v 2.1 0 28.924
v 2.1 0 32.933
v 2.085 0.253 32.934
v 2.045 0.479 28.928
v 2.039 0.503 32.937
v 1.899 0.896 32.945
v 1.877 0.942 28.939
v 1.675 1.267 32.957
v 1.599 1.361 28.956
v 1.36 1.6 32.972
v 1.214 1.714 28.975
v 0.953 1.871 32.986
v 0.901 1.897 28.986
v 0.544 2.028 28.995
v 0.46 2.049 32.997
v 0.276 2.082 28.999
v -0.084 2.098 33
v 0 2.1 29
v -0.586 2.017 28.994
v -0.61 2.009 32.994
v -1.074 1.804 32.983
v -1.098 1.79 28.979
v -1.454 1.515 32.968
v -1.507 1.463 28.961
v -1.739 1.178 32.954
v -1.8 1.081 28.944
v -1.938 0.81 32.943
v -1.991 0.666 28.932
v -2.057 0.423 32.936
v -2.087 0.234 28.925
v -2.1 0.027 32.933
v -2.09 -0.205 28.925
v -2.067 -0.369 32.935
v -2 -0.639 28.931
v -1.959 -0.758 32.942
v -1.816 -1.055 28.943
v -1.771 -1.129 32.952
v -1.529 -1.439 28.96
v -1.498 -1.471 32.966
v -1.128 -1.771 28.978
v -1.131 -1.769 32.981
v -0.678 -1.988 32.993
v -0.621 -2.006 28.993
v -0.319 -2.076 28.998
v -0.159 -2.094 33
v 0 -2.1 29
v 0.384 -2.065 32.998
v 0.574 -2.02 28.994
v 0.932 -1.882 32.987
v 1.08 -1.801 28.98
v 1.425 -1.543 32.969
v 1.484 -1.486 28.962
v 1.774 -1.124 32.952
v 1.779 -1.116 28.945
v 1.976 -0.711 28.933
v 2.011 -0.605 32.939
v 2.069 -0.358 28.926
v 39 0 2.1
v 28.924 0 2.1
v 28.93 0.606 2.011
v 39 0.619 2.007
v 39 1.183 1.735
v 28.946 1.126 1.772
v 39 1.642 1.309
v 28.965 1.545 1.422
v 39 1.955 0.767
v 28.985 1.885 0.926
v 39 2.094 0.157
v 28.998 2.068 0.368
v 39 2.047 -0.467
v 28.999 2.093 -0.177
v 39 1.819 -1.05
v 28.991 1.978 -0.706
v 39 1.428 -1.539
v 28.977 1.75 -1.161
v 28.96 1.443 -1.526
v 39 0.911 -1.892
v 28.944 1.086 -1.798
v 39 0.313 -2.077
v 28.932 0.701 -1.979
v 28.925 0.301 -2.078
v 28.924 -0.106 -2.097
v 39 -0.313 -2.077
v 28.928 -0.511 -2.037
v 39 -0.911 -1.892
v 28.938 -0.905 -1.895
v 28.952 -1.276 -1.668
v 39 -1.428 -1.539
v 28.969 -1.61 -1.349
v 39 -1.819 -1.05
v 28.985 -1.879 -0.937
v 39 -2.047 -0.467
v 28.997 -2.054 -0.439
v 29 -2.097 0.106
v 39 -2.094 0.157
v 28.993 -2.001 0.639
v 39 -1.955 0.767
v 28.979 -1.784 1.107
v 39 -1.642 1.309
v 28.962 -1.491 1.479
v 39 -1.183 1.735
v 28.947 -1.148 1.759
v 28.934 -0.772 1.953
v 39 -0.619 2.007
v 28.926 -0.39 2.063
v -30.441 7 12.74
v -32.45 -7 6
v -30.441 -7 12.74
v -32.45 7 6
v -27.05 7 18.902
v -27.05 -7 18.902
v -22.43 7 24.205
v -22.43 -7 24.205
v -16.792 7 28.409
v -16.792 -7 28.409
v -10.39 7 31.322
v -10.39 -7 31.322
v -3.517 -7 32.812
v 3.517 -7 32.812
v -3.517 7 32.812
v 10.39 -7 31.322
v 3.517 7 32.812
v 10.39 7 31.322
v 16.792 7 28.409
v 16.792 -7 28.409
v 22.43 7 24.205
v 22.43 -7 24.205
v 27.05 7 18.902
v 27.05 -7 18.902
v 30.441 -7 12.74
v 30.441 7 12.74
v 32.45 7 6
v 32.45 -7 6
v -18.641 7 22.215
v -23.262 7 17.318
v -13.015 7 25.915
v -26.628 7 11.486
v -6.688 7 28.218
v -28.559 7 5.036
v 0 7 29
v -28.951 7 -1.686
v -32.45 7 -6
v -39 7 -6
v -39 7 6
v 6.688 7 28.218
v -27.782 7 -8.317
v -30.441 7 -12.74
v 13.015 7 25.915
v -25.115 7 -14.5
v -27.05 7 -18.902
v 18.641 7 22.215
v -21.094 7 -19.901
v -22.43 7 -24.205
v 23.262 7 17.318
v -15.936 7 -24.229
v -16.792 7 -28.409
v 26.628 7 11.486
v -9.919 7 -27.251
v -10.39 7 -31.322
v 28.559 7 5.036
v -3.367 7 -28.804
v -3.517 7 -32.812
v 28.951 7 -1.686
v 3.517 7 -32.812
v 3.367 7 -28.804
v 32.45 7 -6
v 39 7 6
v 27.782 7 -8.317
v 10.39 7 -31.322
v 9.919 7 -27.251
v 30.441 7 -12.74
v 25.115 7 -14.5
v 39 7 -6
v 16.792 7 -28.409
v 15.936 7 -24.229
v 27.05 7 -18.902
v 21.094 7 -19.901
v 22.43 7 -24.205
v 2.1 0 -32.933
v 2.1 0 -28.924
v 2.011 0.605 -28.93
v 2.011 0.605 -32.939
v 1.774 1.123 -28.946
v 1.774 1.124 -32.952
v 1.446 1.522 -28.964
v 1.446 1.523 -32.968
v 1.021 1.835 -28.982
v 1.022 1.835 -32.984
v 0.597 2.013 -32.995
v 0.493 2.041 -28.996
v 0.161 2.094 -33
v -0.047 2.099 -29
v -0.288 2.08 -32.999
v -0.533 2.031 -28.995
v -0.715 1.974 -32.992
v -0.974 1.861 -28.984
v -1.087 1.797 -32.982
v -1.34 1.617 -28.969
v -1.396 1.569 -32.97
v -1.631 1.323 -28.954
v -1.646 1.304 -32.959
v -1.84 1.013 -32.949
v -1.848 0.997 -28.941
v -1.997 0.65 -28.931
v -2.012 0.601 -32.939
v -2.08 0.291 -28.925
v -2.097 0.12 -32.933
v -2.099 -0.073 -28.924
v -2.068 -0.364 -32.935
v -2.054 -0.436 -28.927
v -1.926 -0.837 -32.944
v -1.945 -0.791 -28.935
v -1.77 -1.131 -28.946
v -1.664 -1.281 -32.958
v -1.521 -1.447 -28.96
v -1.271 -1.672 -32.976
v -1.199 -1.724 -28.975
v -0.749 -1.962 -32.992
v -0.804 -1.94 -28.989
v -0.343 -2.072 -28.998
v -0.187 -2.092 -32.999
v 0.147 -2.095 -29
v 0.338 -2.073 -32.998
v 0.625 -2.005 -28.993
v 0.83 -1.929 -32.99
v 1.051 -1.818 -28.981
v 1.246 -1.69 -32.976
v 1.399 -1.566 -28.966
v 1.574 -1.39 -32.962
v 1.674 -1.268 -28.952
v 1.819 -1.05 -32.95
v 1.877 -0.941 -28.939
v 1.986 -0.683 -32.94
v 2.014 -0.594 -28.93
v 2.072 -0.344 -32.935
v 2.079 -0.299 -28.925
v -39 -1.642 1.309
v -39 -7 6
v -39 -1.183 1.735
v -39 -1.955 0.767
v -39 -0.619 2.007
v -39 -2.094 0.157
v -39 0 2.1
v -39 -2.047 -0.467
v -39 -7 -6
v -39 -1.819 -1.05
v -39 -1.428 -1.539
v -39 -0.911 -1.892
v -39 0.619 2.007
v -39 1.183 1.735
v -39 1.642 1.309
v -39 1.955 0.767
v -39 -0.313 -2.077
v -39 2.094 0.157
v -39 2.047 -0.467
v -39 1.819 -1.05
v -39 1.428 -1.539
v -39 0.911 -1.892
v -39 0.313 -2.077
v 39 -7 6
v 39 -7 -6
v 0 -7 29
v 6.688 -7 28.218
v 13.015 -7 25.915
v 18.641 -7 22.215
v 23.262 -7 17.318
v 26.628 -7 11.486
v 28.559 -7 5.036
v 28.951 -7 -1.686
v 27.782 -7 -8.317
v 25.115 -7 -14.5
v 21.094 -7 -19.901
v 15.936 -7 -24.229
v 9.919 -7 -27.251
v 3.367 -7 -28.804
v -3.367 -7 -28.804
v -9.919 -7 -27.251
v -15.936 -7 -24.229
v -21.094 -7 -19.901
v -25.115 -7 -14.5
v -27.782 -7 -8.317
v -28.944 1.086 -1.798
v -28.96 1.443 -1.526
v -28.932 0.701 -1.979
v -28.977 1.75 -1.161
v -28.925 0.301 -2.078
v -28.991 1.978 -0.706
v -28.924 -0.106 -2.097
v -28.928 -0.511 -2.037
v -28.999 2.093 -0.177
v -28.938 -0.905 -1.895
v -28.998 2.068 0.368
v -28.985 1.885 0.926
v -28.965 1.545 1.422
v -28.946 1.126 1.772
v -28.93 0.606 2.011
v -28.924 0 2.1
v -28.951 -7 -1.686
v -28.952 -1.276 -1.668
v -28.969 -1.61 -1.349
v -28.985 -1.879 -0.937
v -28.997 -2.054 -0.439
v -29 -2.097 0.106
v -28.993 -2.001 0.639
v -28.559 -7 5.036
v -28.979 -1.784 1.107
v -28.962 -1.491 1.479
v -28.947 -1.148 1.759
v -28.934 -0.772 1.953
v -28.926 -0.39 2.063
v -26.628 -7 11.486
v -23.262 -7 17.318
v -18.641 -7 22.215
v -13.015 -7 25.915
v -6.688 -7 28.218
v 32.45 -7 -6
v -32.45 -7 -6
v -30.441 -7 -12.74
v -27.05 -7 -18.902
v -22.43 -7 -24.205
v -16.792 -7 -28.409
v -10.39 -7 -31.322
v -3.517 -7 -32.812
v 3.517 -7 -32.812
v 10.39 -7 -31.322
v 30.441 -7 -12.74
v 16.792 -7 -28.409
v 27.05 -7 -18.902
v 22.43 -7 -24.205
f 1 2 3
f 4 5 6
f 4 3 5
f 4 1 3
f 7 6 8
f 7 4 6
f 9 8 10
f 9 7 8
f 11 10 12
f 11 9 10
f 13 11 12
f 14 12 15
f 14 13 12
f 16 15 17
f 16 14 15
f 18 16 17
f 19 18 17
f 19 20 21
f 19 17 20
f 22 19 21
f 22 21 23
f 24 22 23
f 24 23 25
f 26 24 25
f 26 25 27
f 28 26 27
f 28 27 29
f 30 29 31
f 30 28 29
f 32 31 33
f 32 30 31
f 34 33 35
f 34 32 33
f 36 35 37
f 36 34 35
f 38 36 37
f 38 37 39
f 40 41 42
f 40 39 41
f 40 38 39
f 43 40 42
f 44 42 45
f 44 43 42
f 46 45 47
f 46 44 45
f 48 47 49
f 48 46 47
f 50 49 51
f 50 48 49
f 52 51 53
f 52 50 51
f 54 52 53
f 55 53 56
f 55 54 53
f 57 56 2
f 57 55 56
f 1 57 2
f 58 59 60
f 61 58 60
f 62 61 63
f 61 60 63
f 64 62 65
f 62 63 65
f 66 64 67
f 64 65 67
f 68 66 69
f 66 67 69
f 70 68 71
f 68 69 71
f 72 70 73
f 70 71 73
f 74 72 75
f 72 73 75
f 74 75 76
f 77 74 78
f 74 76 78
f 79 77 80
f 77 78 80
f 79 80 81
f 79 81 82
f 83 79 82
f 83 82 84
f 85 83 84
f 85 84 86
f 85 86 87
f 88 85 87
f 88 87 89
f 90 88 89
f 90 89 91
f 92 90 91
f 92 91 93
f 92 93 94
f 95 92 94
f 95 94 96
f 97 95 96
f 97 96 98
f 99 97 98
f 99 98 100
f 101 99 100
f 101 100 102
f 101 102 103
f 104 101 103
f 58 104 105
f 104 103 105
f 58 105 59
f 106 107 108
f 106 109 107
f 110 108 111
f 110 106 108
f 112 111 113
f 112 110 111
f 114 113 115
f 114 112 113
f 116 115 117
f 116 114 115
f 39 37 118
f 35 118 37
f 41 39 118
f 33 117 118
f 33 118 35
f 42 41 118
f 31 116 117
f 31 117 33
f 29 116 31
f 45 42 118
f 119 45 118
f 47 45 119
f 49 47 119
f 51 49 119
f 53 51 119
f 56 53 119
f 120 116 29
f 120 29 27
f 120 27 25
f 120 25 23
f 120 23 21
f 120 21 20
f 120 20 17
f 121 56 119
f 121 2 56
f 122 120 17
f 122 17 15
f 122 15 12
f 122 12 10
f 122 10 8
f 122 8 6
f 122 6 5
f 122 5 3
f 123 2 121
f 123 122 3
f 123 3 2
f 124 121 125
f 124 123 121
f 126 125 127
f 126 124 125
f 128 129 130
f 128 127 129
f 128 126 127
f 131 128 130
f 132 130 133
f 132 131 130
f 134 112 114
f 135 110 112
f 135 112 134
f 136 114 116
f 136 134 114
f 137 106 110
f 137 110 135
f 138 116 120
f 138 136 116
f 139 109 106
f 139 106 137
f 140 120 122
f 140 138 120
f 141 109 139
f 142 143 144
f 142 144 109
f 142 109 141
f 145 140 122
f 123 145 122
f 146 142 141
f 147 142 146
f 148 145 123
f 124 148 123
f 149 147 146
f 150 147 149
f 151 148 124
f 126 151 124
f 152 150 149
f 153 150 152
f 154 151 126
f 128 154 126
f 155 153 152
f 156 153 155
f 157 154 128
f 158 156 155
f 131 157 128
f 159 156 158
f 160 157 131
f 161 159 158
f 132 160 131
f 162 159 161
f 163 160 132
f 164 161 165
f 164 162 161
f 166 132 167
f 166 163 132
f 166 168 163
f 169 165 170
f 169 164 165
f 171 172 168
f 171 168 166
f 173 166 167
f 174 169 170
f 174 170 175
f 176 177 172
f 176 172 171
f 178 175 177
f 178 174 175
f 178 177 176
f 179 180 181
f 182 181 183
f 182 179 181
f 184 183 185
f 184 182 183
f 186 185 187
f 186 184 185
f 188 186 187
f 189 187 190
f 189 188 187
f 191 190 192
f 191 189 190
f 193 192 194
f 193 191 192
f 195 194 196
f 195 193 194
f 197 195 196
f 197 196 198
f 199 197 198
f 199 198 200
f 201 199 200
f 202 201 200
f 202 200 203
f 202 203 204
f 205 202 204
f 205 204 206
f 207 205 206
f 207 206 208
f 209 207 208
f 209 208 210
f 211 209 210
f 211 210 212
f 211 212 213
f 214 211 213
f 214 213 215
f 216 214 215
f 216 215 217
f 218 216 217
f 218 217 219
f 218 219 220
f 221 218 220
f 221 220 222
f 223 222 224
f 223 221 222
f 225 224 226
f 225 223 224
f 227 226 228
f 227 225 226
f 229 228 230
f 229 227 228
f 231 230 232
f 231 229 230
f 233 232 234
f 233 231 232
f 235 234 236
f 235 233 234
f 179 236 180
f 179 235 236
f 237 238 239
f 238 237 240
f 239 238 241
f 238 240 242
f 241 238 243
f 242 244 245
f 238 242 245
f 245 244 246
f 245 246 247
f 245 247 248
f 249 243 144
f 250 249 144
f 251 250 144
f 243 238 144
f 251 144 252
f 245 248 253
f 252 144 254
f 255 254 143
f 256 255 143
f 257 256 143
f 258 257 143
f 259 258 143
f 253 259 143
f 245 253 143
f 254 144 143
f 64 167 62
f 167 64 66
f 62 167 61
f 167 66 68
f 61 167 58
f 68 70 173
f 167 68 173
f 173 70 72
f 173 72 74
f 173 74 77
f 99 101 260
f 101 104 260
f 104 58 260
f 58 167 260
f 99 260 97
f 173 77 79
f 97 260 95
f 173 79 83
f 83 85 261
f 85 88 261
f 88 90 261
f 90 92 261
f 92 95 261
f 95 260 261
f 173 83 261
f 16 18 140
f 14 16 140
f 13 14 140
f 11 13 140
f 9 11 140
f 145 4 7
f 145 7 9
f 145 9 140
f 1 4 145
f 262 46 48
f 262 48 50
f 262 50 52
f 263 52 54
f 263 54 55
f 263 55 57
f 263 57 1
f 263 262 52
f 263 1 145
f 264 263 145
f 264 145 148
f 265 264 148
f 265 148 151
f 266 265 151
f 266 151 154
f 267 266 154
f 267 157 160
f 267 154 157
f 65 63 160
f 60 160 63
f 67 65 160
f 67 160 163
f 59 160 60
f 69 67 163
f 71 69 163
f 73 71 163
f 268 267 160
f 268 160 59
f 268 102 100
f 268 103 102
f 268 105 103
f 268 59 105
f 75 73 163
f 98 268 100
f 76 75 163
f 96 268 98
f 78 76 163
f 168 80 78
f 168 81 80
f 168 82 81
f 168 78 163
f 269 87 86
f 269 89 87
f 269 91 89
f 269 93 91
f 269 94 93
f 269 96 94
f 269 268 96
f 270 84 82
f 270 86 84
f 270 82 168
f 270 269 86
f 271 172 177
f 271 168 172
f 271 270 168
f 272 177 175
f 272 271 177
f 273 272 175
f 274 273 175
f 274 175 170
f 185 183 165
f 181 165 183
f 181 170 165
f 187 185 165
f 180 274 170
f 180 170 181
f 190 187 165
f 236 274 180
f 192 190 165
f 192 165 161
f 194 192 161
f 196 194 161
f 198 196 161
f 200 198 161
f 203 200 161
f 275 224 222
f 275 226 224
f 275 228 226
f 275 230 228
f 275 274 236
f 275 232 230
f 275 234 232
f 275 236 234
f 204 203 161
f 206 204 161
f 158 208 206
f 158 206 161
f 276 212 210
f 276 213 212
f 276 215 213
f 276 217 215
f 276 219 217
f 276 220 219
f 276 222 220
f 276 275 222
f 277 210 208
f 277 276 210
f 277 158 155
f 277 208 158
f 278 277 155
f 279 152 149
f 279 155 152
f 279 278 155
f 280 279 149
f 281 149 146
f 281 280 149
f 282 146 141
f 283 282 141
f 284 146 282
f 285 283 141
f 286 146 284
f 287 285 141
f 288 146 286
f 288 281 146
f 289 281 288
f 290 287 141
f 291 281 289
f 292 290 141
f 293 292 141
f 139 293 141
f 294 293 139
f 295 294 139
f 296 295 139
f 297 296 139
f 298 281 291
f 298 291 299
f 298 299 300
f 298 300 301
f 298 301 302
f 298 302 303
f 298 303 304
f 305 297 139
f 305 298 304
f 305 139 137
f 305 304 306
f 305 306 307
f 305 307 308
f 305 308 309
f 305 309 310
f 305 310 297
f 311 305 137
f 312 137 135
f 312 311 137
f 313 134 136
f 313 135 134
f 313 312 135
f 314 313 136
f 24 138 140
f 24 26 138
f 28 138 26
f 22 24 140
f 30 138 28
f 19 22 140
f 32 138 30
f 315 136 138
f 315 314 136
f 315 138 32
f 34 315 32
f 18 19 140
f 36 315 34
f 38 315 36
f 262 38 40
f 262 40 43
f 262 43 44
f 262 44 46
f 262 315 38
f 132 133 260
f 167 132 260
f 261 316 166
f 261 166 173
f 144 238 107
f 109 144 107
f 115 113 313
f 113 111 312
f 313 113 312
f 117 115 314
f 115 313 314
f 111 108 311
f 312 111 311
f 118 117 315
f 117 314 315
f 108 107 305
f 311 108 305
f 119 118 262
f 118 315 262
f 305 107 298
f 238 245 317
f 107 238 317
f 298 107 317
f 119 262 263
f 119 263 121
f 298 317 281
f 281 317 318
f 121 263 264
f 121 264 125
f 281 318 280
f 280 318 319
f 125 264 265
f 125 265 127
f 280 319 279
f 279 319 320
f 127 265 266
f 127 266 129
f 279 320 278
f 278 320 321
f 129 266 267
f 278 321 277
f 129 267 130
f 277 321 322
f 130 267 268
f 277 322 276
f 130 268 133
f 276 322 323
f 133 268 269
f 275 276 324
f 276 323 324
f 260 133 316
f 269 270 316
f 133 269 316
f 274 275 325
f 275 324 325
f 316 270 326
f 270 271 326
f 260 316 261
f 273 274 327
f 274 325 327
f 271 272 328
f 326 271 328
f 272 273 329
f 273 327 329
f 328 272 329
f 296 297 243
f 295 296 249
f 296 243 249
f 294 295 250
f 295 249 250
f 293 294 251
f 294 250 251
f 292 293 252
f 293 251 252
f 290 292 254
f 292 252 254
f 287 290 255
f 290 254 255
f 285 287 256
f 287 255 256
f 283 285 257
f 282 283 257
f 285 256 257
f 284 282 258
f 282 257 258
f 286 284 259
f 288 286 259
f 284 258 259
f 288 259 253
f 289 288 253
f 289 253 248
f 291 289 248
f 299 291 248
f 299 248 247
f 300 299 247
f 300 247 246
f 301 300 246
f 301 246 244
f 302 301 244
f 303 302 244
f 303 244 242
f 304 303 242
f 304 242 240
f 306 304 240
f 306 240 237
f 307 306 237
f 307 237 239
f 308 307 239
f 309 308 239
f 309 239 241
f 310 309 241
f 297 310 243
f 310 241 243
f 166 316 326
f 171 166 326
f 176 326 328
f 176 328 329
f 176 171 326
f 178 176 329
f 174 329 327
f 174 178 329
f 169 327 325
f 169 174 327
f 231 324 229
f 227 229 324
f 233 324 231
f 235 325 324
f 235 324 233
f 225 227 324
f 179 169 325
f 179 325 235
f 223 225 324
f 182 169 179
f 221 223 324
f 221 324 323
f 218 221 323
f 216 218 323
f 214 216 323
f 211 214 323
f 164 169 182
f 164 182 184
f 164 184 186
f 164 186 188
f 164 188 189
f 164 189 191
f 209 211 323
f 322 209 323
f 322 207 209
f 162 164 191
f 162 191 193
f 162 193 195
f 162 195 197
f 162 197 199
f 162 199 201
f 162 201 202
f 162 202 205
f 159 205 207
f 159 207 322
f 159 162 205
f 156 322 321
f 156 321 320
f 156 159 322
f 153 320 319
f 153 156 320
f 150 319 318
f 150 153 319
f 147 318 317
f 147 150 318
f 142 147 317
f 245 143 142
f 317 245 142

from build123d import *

# Parameters (mm, degrees)
SKETCH1_R               = 33
SKETCH1_R_2             = 29
BOSS_EXTRUDE1_DEPTH     = 7
SKETCH2_W               = 10
SKETCH2_H               = 12
BOSS_EXTRUDE2_DEPTH     = 7
SKETCH5_R               = 2.1
CUT_EXTRUDE1_DEPTH      = 85.982351109
CUT_EXTRUDE4_DEPTH      = 52.565492427
CUT_EXTRUDE4_DEPTH_BACK = 52.565492427
SKETCH7_R               = 2.1


with BuildPart() as part:
    # Sketch1 → Boss-Extrude1 (new, symmetric)
    with BuildSketch(Plane(origin=(0, 0, 0), x_dir=(1, 0, 0), z_dir=(0, 1, 0))):
        with Locations(Location((0, 0, 0), (0, 0, 270))):
            Circle(SKETCH1_R)
        with Locations(Location((0, 0, 0), (0, 0, 270))):
            Circle(SKETCH1_R_2, mode=Mode.SUBTRACT)
    extrude(amount=BOSS_EXTRUDE1_DEPTH, both=True)

    # Sketch2 → Boss-Extrude2 (add, symmetric)
    with BuildSketch(Plane(origin=(0, 0, 0), x_dir=(1, 0, 0), z_dir=(0, 1, 0))):
        with Locations((34, 0)):
            Rectangle(SKETCH2_W, SKETCH2_H)
        with Locations((-34, 0)):
            Rectangle(SKETCH2_W, SKETCH2_H)
    extrude(amount=BOSS_EXTRUDE2_DEPTH, both=True)

    # Sketch5 → Cut-Extrude1 (cut, through all)
    with BuildSketch(Plane.ZY.offset(39)):
        Circle(SKETCH5_R)
    extrude(amount=-CUT_EXTRUDE1_DEPTH, mode=Mode.SUBTRACT)

    # Sketch7 → Cut-Extrude4 (cut, two sides: drawn at the far end of the back side and taken through both)
    with BuildSketch(Plane.XY.offset(-CUT_EXTRUDE4_DEPTH_BACK)):
        Circle(SKETCH7_R)
    extrude(amount=CUT_EXTRUDE4_DEPTH + CUT_EXTRUDE4_DEPTH_BACK, mode=Mode.SUBTRACT)


solid = part.part
